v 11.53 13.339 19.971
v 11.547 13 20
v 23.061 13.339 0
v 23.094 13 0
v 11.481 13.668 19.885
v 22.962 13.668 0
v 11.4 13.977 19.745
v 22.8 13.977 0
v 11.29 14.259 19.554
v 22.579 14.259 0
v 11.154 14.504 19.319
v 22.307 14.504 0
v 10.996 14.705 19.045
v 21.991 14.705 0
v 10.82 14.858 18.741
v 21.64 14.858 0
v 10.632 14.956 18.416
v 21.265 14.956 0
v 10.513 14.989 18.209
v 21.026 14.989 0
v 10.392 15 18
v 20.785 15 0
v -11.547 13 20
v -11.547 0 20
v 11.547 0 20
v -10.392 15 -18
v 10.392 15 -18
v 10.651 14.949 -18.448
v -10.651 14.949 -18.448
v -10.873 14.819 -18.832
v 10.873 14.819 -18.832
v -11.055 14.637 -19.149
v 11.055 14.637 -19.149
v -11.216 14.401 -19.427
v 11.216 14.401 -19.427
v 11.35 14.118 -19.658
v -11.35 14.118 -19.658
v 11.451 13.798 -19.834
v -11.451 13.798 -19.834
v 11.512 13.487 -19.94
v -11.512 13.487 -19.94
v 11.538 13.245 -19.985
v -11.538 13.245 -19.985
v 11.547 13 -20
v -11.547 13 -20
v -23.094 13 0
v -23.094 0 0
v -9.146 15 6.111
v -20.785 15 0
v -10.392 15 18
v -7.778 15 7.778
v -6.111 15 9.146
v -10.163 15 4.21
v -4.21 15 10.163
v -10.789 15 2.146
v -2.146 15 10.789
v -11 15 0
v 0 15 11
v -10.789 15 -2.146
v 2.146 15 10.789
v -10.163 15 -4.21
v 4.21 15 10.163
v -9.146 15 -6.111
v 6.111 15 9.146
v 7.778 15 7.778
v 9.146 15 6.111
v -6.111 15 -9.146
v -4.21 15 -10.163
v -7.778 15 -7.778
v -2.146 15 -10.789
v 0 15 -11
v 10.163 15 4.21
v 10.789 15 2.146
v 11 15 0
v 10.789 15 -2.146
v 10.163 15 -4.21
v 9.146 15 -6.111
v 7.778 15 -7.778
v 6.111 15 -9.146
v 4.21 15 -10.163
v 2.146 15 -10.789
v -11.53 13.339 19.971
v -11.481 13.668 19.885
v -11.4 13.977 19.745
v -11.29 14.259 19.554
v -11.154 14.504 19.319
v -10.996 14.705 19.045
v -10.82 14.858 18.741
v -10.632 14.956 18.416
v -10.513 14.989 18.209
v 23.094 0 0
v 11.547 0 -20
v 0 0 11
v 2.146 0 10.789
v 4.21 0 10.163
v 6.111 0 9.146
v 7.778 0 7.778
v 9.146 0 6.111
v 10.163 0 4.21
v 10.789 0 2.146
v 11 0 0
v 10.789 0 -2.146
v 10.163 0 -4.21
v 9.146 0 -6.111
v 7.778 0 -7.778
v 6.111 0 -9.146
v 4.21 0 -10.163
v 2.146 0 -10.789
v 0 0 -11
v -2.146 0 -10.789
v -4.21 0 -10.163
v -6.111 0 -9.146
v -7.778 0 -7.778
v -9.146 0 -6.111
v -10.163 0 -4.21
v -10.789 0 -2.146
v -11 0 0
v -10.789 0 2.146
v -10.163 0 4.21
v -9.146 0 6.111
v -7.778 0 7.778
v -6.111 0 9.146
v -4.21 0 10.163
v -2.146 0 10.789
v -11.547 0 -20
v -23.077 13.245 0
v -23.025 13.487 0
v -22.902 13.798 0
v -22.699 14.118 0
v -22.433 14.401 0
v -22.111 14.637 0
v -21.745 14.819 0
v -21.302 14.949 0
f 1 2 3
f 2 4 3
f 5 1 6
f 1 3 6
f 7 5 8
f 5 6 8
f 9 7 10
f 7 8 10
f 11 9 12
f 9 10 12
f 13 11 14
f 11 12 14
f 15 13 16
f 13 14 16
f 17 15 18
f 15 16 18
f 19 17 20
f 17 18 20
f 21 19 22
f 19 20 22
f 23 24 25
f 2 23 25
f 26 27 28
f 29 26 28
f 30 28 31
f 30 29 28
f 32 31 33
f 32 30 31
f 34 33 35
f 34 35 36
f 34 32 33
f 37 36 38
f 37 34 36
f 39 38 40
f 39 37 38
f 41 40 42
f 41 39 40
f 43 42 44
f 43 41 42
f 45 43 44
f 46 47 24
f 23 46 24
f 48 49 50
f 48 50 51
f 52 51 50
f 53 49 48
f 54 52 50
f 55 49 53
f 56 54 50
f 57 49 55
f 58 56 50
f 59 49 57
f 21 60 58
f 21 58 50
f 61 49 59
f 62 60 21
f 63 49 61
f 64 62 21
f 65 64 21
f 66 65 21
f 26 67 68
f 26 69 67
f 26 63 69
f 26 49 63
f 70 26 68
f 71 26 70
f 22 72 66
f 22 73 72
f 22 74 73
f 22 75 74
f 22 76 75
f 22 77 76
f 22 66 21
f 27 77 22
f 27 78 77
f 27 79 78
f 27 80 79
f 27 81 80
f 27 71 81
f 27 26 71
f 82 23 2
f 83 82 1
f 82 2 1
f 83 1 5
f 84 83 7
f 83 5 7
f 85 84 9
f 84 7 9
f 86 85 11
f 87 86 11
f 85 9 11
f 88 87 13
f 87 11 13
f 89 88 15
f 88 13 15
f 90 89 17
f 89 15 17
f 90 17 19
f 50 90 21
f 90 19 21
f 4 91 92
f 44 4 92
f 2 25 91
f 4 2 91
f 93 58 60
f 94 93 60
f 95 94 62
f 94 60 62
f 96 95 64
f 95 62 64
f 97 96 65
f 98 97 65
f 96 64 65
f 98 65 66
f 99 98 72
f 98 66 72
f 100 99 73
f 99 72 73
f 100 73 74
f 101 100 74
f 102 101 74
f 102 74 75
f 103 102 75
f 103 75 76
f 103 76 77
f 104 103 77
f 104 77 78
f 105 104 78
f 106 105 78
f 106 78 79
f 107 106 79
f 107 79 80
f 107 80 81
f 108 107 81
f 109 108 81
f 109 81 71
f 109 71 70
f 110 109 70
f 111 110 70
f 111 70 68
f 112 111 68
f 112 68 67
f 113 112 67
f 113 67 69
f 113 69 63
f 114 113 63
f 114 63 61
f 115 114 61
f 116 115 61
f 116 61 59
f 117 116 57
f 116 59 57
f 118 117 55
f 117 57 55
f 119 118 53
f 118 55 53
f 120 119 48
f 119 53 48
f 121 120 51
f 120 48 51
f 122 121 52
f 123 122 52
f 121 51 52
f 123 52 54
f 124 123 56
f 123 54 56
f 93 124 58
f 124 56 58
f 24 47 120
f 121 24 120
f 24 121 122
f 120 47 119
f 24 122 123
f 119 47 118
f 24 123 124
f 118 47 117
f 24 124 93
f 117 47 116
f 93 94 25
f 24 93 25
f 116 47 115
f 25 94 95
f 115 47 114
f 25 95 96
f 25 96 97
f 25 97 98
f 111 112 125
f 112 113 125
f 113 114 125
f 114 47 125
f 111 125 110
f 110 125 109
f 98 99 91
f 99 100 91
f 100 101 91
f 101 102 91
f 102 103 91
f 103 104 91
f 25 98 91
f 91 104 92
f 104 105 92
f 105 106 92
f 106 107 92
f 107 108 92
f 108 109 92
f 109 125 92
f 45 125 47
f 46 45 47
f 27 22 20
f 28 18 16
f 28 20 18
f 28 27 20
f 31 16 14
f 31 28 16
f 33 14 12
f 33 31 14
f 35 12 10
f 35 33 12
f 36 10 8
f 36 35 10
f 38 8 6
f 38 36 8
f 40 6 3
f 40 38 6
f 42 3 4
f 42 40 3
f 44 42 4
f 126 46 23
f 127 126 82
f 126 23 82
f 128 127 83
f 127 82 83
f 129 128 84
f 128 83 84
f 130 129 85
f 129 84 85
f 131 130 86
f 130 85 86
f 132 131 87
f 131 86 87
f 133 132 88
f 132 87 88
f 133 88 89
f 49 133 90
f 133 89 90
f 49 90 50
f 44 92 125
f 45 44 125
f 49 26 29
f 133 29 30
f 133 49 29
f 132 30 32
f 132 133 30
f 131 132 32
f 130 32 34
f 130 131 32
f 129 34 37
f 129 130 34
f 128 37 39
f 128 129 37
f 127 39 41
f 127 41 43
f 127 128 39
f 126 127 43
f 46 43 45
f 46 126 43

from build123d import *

# Parameters (mm, degrees)
EXTRUDE_1_DEPTH     = 15
SKETCH_2_R          = 11
CUT_EXTRUDE_1_DEPTH = 35.034296428
FILLET_1_R          = 2


with BuildPart() as part:
    # 草图1 → 凸台-拉伸1 (new body)
    with BuildSketch(Plane(origin=(0, 0, 0), x_dir=(1, 0, 0), z_dir=(0, 1, 0))):
        Polygon((-11.547005384, -20), (11.547005384, -20), (23.094010768, 0), (11.547005384, 20), (-11.547005384, 20), (-23.094010768, 0), align=None)
    extrude(amount=EXTRUDE_1_DEPTH)

    # 草图2 → 切除-拉伸1 (cut, through all)
    with BuildSketch(Plane(origin=(0, 15, 0), x_dir=(1, 0, 0), z_dir=(0, 1, 0))):
        with Locations(Location((0, 0, 0), (0, 0, 270))):
            Circle(SKETCH_2_R)
    extrude(amount=-CUT_EXTRUDE_1_DEPTH, mode=Mode.SUBTRACT)

    # 圆角1
    fillet_1_edges = [part.edges().sort_by_distance(p)[0] for p in [
        (17.320508076, 15, 10),
        (17.320508076, 15, -10),
        (0, 15, -20),
        (-17.320508076, 15, -10),
        (-17.320508076, 15, 10),
        (0, 15, 20),
    ]]
    fillet(fillet_1_edges, radius=FILLET_1_R)


solid = part.part
